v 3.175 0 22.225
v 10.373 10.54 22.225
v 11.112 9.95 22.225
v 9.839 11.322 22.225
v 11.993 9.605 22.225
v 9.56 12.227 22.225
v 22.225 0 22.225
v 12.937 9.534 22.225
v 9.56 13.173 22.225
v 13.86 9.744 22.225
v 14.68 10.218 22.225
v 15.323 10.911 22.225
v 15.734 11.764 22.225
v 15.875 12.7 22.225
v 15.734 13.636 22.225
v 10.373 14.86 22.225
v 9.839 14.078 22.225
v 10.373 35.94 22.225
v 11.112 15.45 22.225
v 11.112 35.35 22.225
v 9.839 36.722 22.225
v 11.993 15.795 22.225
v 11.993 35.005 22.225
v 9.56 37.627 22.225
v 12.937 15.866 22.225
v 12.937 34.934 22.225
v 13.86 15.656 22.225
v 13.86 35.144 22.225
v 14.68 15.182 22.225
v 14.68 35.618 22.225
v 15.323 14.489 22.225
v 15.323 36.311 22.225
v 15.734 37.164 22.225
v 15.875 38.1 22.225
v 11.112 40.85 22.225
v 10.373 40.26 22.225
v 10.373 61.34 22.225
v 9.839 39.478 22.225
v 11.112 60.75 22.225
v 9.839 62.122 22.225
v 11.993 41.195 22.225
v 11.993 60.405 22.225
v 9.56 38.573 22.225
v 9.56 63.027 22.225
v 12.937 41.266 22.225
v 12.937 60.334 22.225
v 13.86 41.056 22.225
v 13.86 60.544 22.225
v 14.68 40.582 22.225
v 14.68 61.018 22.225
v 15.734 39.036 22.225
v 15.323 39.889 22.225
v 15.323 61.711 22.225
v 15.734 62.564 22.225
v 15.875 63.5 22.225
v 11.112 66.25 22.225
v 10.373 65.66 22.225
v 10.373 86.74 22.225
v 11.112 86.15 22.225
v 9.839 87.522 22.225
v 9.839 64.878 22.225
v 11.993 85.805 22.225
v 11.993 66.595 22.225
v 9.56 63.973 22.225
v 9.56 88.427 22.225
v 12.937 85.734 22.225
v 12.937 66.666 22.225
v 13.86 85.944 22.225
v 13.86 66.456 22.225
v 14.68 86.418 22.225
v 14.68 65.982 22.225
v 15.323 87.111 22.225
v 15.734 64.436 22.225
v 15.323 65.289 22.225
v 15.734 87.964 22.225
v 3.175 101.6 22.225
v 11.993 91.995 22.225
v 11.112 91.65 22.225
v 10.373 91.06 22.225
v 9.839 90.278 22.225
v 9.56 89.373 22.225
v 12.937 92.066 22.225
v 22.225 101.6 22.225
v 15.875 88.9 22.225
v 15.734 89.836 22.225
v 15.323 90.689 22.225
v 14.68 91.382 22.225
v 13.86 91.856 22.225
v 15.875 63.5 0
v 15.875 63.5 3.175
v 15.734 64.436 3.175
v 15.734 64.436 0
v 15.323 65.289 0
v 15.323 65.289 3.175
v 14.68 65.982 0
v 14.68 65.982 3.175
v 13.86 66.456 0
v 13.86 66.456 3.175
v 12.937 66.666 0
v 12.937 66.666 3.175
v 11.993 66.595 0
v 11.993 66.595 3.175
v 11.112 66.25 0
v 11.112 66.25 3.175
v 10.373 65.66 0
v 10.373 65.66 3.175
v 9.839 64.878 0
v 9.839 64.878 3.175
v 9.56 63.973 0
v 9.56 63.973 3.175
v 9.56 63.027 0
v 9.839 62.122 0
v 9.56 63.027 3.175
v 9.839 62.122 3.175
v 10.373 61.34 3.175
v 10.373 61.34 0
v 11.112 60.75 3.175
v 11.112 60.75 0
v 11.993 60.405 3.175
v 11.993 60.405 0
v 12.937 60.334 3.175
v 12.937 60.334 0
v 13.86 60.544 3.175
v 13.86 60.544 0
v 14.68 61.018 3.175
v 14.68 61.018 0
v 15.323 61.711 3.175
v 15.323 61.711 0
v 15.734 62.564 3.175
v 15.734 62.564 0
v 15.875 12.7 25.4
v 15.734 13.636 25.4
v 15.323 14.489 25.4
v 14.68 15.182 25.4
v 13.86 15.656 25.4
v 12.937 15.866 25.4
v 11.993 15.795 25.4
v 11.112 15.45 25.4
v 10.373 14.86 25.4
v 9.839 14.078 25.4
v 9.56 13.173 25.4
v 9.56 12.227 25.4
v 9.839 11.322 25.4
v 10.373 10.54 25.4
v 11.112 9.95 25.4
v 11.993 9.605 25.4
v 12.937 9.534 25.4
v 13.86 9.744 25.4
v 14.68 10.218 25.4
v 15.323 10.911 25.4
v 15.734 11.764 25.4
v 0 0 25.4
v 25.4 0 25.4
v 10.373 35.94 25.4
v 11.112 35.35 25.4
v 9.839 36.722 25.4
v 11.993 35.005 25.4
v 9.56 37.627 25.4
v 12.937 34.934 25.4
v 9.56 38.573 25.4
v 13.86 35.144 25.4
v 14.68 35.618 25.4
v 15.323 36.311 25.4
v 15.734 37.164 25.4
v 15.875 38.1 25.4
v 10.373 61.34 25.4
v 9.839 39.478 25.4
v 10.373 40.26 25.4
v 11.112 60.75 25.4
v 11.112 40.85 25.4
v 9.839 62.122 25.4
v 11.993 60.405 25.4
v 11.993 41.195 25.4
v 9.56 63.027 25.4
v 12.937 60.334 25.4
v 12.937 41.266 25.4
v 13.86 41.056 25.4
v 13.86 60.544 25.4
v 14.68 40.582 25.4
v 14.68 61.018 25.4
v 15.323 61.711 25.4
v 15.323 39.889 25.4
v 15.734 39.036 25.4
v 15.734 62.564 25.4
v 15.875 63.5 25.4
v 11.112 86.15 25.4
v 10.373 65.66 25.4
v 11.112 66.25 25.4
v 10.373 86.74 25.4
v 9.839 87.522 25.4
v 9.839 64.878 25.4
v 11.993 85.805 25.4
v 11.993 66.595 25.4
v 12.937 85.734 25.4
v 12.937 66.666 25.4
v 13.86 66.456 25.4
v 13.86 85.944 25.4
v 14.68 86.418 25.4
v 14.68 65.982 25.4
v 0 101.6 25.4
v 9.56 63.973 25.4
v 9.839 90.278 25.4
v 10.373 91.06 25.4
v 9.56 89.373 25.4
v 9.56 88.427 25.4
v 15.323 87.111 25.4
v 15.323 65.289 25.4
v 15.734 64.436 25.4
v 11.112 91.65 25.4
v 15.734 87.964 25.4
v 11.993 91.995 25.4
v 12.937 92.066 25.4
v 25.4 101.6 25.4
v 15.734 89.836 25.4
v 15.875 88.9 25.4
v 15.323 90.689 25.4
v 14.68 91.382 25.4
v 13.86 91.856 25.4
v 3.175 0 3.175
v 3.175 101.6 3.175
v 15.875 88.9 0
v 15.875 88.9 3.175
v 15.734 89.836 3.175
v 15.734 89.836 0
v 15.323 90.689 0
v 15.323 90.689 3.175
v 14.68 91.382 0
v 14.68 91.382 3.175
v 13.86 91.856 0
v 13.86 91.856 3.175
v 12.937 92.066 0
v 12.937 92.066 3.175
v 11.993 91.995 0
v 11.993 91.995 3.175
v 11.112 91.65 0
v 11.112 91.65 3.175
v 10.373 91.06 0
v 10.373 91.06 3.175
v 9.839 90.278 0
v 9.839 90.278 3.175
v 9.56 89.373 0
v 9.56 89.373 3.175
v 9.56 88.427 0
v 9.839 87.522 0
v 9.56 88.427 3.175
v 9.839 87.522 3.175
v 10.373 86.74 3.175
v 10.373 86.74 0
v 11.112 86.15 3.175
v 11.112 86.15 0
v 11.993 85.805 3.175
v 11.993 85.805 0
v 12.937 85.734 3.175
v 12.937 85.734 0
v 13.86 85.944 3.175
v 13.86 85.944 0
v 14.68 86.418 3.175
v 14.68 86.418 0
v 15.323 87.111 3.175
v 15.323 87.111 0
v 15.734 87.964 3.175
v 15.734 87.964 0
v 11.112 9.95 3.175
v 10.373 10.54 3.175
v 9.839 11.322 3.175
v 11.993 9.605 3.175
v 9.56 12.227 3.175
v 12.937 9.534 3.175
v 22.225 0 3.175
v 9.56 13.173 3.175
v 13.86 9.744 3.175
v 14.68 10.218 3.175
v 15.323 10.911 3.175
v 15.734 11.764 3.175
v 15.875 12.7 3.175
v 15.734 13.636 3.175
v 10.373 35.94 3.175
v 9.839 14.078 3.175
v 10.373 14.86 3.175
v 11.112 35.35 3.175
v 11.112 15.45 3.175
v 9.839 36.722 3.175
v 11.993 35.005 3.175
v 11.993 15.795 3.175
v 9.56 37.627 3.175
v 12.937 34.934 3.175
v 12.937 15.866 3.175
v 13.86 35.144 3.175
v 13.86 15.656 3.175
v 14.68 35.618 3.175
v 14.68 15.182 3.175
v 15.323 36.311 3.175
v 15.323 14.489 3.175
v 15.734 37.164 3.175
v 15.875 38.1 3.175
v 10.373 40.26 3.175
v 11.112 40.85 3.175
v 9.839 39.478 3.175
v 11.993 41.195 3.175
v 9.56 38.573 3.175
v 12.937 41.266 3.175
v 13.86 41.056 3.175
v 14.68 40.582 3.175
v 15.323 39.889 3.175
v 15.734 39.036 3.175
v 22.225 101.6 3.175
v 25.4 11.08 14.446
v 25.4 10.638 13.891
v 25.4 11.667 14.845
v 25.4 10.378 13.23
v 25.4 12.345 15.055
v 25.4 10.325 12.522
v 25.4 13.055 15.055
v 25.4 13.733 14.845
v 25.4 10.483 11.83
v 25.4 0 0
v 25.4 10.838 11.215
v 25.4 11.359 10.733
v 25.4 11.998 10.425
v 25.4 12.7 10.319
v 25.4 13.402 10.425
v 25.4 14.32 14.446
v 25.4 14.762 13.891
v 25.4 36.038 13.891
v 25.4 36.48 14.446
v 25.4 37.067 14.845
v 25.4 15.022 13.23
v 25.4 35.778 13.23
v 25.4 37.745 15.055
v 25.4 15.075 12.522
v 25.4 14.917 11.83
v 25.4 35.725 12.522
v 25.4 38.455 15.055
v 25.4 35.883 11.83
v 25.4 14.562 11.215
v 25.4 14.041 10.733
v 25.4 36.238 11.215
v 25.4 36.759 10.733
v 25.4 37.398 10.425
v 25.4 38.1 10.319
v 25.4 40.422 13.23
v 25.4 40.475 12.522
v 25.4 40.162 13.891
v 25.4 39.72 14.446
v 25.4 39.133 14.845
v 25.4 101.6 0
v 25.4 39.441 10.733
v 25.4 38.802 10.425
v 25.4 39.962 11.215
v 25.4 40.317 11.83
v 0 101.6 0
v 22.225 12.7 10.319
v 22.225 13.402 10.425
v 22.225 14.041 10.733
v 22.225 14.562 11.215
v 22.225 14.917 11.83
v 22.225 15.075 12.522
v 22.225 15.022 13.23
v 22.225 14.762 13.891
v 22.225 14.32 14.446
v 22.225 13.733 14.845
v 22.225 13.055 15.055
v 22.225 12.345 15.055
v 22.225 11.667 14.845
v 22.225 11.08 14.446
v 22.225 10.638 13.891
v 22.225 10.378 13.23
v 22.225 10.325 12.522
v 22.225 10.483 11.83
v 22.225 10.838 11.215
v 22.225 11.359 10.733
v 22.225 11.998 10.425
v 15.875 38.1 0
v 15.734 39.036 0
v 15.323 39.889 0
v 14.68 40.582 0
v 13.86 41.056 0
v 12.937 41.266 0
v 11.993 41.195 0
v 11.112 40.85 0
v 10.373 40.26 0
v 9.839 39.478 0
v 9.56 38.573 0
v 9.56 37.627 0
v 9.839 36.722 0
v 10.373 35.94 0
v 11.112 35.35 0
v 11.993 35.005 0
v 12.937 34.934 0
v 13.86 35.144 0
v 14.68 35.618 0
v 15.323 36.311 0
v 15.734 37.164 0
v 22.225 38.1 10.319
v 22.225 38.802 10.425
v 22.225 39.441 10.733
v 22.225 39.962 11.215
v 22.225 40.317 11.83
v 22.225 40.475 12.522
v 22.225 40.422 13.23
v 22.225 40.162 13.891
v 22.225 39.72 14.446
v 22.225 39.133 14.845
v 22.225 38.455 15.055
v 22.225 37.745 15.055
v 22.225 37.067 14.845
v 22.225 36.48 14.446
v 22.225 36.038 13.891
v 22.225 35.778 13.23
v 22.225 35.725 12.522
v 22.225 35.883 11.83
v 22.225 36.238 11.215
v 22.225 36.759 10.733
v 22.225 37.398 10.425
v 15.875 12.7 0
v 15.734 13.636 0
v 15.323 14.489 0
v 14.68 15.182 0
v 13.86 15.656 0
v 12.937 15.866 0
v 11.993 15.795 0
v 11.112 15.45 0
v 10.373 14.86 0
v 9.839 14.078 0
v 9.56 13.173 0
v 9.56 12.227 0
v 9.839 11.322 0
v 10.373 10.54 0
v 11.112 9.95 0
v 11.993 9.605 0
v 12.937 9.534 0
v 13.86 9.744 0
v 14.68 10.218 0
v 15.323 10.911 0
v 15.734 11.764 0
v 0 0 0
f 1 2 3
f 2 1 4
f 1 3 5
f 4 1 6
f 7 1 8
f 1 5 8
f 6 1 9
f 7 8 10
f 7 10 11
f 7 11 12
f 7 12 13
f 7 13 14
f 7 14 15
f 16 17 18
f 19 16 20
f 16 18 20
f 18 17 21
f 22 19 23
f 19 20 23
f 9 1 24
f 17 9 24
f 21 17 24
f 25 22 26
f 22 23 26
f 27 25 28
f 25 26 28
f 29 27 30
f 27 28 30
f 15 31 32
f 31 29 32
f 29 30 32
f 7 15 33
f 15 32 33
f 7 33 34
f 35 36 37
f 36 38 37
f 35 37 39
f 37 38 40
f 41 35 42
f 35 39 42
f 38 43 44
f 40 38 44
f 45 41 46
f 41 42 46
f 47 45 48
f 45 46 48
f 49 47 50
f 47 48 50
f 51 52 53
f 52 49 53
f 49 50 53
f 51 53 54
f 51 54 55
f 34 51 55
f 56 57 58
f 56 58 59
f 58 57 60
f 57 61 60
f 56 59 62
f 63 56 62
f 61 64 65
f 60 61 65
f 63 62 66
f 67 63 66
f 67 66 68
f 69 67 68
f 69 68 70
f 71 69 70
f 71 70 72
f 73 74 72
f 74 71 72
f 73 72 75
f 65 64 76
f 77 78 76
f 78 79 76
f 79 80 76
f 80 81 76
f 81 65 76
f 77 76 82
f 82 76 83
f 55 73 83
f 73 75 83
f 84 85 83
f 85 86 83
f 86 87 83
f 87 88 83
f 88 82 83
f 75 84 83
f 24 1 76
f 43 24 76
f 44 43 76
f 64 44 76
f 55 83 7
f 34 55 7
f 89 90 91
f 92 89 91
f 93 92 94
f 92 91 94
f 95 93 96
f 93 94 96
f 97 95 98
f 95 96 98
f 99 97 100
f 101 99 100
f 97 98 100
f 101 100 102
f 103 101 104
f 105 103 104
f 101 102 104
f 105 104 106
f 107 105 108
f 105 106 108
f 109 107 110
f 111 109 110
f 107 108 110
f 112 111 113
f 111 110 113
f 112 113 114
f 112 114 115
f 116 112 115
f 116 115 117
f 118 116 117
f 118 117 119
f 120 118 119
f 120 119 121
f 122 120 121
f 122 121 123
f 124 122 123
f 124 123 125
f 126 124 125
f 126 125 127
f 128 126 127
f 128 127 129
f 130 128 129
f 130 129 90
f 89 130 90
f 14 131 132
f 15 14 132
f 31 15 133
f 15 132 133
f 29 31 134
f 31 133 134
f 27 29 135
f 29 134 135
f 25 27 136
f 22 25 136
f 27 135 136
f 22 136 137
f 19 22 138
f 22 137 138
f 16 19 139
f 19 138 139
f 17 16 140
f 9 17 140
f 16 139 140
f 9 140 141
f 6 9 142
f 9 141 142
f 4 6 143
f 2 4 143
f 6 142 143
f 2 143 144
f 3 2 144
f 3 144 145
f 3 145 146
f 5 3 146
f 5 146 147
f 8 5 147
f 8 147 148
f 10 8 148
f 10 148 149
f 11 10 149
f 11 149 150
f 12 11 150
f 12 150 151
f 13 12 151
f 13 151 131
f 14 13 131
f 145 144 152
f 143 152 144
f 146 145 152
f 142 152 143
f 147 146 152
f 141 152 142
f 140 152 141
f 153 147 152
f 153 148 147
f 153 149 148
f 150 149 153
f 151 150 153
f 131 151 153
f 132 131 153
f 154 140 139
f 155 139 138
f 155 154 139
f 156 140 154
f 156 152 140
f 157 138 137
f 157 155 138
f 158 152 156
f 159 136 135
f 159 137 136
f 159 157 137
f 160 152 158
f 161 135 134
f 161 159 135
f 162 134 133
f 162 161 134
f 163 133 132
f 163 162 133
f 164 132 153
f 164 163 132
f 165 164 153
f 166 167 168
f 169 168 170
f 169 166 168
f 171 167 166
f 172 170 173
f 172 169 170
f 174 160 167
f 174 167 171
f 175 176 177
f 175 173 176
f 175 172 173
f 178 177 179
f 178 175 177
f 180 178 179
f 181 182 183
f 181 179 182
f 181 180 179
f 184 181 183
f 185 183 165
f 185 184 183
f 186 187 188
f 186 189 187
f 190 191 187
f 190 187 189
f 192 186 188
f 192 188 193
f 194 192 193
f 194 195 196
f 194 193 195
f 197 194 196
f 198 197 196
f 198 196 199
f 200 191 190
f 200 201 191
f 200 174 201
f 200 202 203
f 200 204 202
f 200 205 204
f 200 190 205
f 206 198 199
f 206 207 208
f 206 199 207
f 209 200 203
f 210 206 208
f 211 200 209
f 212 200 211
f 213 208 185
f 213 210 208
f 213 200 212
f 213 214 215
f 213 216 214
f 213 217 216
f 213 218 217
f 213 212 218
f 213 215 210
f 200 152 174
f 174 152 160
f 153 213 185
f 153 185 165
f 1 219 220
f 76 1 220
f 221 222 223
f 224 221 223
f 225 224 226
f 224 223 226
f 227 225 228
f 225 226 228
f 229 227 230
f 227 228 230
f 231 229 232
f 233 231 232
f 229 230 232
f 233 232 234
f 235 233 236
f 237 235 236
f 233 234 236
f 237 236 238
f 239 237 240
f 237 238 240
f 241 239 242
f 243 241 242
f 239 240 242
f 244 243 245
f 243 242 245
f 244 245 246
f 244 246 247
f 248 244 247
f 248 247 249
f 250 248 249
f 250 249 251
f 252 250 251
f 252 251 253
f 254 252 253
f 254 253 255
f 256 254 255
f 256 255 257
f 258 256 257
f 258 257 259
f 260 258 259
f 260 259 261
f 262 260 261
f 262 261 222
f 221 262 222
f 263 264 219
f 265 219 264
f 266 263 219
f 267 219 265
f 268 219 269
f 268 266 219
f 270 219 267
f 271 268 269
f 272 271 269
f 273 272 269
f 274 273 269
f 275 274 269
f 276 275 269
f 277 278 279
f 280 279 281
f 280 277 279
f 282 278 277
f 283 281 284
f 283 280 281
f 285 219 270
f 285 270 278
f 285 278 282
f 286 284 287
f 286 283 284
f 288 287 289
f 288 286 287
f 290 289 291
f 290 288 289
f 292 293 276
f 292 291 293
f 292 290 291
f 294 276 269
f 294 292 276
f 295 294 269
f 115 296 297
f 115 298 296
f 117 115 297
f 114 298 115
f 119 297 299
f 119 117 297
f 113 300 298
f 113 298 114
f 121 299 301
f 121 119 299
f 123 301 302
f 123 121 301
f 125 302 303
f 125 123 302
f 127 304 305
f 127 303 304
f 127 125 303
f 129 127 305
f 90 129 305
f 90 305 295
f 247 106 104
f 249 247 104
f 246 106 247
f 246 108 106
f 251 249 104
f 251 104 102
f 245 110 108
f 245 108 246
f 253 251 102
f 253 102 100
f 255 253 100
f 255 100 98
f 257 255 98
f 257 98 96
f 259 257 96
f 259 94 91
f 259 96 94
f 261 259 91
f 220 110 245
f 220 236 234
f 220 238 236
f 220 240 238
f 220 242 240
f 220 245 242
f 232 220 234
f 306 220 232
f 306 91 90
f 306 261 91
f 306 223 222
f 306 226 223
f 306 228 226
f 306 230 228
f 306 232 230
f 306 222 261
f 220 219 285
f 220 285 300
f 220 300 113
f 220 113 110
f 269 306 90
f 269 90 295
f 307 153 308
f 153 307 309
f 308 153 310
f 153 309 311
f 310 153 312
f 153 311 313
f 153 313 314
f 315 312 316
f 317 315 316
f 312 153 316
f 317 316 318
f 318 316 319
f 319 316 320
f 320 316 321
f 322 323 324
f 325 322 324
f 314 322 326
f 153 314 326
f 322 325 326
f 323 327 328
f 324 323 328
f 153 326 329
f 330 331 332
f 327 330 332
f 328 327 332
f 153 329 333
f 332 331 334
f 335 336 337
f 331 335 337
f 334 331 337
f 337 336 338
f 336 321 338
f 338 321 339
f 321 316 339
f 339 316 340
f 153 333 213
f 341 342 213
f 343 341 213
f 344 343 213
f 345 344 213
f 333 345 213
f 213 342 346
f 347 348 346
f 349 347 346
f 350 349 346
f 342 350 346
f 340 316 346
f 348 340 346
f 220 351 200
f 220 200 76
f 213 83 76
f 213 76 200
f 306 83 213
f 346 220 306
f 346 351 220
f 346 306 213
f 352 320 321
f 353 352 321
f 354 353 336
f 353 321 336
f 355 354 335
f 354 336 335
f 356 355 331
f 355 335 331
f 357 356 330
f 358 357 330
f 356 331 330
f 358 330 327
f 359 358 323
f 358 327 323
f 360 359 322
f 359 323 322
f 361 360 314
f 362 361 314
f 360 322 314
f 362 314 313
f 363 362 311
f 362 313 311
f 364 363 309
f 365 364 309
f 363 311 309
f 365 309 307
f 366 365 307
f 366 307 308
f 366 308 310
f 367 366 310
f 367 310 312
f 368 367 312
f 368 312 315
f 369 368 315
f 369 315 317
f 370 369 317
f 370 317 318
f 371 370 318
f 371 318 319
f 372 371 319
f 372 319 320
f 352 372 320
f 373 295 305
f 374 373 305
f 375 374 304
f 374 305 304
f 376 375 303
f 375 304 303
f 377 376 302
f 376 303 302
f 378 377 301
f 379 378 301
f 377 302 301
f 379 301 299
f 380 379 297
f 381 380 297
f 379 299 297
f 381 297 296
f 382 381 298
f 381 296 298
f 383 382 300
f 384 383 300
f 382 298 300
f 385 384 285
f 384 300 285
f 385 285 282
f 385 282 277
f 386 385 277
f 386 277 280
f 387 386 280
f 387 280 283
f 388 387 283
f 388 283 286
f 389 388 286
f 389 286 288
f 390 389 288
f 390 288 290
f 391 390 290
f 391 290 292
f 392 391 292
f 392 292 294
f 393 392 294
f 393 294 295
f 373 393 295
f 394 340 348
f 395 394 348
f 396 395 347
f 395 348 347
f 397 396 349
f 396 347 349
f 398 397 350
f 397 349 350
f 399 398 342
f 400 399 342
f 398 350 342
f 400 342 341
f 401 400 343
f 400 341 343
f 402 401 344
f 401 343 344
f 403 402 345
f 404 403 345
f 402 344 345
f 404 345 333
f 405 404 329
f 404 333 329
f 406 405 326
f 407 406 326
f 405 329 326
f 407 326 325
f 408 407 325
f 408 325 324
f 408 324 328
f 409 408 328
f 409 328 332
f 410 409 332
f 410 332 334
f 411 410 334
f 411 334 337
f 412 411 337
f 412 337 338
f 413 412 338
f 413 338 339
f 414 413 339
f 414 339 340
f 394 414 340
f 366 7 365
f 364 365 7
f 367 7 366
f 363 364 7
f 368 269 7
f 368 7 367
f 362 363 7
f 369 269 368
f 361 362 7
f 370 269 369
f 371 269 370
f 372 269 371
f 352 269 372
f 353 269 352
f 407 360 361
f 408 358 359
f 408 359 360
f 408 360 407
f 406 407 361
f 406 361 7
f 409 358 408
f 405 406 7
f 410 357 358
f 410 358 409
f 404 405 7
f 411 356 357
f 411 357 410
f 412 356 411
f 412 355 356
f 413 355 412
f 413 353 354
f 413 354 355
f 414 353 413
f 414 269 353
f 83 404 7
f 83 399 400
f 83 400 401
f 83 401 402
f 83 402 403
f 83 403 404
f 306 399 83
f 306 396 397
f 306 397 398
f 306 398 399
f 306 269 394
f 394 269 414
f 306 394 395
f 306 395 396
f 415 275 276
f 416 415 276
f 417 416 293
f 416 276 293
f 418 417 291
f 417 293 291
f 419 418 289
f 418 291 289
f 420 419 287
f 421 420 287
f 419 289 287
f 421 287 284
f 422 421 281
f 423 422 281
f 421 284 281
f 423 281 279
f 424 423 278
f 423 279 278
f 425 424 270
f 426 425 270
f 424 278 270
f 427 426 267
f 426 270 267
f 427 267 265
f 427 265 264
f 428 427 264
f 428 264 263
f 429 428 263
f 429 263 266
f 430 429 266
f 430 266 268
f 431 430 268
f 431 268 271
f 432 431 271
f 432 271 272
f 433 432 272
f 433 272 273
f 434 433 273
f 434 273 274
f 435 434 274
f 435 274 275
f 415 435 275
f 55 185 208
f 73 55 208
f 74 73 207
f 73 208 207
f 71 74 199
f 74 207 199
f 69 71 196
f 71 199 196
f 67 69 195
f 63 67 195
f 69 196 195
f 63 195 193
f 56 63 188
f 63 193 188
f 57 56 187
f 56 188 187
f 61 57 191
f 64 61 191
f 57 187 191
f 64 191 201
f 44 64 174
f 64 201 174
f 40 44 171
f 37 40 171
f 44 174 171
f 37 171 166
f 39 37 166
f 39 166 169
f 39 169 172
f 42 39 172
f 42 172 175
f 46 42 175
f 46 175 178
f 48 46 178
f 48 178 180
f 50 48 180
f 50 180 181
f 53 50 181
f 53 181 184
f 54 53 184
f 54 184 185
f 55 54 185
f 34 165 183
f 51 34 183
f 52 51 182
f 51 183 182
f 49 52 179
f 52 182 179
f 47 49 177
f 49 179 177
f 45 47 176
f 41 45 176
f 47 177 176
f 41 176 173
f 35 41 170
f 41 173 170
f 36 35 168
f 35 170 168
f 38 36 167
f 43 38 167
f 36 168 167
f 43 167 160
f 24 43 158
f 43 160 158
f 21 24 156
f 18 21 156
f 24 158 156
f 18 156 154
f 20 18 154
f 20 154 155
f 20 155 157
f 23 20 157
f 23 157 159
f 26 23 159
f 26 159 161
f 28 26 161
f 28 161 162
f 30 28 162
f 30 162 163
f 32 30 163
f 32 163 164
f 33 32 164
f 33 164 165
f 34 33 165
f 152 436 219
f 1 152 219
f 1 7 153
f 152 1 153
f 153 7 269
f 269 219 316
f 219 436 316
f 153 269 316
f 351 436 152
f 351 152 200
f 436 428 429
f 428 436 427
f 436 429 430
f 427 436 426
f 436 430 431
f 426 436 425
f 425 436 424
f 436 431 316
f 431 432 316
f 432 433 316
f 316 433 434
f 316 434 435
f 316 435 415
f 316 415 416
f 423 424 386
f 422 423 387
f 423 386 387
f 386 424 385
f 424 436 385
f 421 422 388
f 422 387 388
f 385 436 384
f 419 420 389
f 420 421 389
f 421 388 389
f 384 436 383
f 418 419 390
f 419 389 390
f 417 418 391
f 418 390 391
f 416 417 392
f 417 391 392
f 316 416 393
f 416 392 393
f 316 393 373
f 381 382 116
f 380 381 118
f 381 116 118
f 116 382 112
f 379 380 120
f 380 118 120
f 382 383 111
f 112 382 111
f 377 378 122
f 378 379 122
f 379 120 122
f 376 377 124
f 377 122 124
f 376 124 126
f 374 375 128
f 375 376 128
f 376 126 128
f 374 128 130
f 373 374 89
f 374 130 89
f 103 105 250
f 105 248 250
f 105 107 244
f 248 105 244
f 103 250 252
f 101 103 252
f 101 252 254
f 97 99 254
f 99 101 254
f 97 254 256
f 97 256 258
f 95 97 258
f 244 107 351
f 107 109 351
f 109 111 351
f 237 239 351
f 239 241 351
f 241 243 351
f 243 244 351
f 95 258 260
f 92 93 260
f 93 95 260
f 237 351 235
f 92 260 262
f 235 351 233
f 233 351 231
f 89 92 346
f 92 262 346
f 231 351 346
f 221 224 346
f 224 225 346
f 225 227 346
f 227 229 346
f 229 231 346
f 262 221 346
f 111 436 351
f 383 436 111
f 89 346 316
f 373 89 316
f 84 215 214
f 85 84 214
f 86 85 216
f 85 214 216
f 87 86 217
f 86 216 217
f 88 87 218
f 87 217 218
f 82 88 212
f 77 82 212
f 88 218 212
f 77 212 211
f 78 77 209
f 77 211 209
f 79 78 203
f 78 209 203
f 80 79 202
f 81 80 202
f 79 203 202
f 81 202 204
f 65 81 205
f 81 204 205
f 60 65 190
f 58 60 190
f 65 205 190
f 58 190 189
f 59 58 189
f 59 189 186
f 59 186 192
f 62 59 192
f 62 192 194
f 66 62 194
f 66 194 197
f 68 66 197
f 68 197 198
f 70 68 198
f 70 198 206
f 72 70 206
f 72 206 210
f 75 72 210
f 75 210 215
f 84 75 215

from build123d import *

# Parameters (mm, degrees)
SKETCH1_W           = 25.4
SKETCH1_H           = 101.6
BOSS_EXTRUDE1_DEPTH = 25.4
SHELL1_T            = -3.175
SKETCH2_R           = 3.175
CUT_EXTRUDE1_DEPTH  = 108.763073453
SKETCH3_R           = 2.38125
CUT_EXTRUDE2_DEPTH  = 7.62


with BuildPart() as part:
    # Sketch1 → Boss-Extrude1 (new body)
    with BuildSketch(Plane.XY):
        with Locations((12.7, 50.8)):
            Rectangle(SKETCH1_W, SKETCH1_H)
    extrude(amount=BOSS_EXTRUDE1_DEPTH)

    # Shell1
    shell1_openings = [part.faces().sort_by_distance(p)[0] for p in [
        (12.7, 101.6, 12.7),
        (12.7, 0, 12.7),
    ]]
    offset(amount=SHELL1_T, openings=shell1_openings, kind=Kind.INTERSECTION)

    # Sketch2 → Cut-Extrude1 (cut, through all)
    with BuildSketch(Plane.XY.offset(25.4)):
        with Locations((12.7, 12.7)):
            Circle(SKETCH2_R)
        with Locations((12.7, 38.1)):
            Circle(SKETCH2_R)
        with Locations((12.7, 88.9)):
            Circle(SKETCH2_R)
        with Locations((12.7, 63.5)):
            Circle(SKETCH2_R)
    extrude(amount=-CUT_EXTRUDE1_DEPTH, mode=Mode.SUBTRACT)

    # Sketch3 → Cut-Extrude2 (cut)
    with BuildSketch(Plane(origin=(25.4, 0, 0), x_dir=(0, 0, -1), z_dir=(1, 0, 0))):
        with Locations((-12.7, 12.7)):
            Circle(SKETCH3_R)
        with Locations((-12.7, 38.1)):
            Circle(SKETCH3_R)
    extrude(amount=-CUT_EXTRUDE2_DEPTH, mode=Mode.SUBTRACT)


solid = part.part
